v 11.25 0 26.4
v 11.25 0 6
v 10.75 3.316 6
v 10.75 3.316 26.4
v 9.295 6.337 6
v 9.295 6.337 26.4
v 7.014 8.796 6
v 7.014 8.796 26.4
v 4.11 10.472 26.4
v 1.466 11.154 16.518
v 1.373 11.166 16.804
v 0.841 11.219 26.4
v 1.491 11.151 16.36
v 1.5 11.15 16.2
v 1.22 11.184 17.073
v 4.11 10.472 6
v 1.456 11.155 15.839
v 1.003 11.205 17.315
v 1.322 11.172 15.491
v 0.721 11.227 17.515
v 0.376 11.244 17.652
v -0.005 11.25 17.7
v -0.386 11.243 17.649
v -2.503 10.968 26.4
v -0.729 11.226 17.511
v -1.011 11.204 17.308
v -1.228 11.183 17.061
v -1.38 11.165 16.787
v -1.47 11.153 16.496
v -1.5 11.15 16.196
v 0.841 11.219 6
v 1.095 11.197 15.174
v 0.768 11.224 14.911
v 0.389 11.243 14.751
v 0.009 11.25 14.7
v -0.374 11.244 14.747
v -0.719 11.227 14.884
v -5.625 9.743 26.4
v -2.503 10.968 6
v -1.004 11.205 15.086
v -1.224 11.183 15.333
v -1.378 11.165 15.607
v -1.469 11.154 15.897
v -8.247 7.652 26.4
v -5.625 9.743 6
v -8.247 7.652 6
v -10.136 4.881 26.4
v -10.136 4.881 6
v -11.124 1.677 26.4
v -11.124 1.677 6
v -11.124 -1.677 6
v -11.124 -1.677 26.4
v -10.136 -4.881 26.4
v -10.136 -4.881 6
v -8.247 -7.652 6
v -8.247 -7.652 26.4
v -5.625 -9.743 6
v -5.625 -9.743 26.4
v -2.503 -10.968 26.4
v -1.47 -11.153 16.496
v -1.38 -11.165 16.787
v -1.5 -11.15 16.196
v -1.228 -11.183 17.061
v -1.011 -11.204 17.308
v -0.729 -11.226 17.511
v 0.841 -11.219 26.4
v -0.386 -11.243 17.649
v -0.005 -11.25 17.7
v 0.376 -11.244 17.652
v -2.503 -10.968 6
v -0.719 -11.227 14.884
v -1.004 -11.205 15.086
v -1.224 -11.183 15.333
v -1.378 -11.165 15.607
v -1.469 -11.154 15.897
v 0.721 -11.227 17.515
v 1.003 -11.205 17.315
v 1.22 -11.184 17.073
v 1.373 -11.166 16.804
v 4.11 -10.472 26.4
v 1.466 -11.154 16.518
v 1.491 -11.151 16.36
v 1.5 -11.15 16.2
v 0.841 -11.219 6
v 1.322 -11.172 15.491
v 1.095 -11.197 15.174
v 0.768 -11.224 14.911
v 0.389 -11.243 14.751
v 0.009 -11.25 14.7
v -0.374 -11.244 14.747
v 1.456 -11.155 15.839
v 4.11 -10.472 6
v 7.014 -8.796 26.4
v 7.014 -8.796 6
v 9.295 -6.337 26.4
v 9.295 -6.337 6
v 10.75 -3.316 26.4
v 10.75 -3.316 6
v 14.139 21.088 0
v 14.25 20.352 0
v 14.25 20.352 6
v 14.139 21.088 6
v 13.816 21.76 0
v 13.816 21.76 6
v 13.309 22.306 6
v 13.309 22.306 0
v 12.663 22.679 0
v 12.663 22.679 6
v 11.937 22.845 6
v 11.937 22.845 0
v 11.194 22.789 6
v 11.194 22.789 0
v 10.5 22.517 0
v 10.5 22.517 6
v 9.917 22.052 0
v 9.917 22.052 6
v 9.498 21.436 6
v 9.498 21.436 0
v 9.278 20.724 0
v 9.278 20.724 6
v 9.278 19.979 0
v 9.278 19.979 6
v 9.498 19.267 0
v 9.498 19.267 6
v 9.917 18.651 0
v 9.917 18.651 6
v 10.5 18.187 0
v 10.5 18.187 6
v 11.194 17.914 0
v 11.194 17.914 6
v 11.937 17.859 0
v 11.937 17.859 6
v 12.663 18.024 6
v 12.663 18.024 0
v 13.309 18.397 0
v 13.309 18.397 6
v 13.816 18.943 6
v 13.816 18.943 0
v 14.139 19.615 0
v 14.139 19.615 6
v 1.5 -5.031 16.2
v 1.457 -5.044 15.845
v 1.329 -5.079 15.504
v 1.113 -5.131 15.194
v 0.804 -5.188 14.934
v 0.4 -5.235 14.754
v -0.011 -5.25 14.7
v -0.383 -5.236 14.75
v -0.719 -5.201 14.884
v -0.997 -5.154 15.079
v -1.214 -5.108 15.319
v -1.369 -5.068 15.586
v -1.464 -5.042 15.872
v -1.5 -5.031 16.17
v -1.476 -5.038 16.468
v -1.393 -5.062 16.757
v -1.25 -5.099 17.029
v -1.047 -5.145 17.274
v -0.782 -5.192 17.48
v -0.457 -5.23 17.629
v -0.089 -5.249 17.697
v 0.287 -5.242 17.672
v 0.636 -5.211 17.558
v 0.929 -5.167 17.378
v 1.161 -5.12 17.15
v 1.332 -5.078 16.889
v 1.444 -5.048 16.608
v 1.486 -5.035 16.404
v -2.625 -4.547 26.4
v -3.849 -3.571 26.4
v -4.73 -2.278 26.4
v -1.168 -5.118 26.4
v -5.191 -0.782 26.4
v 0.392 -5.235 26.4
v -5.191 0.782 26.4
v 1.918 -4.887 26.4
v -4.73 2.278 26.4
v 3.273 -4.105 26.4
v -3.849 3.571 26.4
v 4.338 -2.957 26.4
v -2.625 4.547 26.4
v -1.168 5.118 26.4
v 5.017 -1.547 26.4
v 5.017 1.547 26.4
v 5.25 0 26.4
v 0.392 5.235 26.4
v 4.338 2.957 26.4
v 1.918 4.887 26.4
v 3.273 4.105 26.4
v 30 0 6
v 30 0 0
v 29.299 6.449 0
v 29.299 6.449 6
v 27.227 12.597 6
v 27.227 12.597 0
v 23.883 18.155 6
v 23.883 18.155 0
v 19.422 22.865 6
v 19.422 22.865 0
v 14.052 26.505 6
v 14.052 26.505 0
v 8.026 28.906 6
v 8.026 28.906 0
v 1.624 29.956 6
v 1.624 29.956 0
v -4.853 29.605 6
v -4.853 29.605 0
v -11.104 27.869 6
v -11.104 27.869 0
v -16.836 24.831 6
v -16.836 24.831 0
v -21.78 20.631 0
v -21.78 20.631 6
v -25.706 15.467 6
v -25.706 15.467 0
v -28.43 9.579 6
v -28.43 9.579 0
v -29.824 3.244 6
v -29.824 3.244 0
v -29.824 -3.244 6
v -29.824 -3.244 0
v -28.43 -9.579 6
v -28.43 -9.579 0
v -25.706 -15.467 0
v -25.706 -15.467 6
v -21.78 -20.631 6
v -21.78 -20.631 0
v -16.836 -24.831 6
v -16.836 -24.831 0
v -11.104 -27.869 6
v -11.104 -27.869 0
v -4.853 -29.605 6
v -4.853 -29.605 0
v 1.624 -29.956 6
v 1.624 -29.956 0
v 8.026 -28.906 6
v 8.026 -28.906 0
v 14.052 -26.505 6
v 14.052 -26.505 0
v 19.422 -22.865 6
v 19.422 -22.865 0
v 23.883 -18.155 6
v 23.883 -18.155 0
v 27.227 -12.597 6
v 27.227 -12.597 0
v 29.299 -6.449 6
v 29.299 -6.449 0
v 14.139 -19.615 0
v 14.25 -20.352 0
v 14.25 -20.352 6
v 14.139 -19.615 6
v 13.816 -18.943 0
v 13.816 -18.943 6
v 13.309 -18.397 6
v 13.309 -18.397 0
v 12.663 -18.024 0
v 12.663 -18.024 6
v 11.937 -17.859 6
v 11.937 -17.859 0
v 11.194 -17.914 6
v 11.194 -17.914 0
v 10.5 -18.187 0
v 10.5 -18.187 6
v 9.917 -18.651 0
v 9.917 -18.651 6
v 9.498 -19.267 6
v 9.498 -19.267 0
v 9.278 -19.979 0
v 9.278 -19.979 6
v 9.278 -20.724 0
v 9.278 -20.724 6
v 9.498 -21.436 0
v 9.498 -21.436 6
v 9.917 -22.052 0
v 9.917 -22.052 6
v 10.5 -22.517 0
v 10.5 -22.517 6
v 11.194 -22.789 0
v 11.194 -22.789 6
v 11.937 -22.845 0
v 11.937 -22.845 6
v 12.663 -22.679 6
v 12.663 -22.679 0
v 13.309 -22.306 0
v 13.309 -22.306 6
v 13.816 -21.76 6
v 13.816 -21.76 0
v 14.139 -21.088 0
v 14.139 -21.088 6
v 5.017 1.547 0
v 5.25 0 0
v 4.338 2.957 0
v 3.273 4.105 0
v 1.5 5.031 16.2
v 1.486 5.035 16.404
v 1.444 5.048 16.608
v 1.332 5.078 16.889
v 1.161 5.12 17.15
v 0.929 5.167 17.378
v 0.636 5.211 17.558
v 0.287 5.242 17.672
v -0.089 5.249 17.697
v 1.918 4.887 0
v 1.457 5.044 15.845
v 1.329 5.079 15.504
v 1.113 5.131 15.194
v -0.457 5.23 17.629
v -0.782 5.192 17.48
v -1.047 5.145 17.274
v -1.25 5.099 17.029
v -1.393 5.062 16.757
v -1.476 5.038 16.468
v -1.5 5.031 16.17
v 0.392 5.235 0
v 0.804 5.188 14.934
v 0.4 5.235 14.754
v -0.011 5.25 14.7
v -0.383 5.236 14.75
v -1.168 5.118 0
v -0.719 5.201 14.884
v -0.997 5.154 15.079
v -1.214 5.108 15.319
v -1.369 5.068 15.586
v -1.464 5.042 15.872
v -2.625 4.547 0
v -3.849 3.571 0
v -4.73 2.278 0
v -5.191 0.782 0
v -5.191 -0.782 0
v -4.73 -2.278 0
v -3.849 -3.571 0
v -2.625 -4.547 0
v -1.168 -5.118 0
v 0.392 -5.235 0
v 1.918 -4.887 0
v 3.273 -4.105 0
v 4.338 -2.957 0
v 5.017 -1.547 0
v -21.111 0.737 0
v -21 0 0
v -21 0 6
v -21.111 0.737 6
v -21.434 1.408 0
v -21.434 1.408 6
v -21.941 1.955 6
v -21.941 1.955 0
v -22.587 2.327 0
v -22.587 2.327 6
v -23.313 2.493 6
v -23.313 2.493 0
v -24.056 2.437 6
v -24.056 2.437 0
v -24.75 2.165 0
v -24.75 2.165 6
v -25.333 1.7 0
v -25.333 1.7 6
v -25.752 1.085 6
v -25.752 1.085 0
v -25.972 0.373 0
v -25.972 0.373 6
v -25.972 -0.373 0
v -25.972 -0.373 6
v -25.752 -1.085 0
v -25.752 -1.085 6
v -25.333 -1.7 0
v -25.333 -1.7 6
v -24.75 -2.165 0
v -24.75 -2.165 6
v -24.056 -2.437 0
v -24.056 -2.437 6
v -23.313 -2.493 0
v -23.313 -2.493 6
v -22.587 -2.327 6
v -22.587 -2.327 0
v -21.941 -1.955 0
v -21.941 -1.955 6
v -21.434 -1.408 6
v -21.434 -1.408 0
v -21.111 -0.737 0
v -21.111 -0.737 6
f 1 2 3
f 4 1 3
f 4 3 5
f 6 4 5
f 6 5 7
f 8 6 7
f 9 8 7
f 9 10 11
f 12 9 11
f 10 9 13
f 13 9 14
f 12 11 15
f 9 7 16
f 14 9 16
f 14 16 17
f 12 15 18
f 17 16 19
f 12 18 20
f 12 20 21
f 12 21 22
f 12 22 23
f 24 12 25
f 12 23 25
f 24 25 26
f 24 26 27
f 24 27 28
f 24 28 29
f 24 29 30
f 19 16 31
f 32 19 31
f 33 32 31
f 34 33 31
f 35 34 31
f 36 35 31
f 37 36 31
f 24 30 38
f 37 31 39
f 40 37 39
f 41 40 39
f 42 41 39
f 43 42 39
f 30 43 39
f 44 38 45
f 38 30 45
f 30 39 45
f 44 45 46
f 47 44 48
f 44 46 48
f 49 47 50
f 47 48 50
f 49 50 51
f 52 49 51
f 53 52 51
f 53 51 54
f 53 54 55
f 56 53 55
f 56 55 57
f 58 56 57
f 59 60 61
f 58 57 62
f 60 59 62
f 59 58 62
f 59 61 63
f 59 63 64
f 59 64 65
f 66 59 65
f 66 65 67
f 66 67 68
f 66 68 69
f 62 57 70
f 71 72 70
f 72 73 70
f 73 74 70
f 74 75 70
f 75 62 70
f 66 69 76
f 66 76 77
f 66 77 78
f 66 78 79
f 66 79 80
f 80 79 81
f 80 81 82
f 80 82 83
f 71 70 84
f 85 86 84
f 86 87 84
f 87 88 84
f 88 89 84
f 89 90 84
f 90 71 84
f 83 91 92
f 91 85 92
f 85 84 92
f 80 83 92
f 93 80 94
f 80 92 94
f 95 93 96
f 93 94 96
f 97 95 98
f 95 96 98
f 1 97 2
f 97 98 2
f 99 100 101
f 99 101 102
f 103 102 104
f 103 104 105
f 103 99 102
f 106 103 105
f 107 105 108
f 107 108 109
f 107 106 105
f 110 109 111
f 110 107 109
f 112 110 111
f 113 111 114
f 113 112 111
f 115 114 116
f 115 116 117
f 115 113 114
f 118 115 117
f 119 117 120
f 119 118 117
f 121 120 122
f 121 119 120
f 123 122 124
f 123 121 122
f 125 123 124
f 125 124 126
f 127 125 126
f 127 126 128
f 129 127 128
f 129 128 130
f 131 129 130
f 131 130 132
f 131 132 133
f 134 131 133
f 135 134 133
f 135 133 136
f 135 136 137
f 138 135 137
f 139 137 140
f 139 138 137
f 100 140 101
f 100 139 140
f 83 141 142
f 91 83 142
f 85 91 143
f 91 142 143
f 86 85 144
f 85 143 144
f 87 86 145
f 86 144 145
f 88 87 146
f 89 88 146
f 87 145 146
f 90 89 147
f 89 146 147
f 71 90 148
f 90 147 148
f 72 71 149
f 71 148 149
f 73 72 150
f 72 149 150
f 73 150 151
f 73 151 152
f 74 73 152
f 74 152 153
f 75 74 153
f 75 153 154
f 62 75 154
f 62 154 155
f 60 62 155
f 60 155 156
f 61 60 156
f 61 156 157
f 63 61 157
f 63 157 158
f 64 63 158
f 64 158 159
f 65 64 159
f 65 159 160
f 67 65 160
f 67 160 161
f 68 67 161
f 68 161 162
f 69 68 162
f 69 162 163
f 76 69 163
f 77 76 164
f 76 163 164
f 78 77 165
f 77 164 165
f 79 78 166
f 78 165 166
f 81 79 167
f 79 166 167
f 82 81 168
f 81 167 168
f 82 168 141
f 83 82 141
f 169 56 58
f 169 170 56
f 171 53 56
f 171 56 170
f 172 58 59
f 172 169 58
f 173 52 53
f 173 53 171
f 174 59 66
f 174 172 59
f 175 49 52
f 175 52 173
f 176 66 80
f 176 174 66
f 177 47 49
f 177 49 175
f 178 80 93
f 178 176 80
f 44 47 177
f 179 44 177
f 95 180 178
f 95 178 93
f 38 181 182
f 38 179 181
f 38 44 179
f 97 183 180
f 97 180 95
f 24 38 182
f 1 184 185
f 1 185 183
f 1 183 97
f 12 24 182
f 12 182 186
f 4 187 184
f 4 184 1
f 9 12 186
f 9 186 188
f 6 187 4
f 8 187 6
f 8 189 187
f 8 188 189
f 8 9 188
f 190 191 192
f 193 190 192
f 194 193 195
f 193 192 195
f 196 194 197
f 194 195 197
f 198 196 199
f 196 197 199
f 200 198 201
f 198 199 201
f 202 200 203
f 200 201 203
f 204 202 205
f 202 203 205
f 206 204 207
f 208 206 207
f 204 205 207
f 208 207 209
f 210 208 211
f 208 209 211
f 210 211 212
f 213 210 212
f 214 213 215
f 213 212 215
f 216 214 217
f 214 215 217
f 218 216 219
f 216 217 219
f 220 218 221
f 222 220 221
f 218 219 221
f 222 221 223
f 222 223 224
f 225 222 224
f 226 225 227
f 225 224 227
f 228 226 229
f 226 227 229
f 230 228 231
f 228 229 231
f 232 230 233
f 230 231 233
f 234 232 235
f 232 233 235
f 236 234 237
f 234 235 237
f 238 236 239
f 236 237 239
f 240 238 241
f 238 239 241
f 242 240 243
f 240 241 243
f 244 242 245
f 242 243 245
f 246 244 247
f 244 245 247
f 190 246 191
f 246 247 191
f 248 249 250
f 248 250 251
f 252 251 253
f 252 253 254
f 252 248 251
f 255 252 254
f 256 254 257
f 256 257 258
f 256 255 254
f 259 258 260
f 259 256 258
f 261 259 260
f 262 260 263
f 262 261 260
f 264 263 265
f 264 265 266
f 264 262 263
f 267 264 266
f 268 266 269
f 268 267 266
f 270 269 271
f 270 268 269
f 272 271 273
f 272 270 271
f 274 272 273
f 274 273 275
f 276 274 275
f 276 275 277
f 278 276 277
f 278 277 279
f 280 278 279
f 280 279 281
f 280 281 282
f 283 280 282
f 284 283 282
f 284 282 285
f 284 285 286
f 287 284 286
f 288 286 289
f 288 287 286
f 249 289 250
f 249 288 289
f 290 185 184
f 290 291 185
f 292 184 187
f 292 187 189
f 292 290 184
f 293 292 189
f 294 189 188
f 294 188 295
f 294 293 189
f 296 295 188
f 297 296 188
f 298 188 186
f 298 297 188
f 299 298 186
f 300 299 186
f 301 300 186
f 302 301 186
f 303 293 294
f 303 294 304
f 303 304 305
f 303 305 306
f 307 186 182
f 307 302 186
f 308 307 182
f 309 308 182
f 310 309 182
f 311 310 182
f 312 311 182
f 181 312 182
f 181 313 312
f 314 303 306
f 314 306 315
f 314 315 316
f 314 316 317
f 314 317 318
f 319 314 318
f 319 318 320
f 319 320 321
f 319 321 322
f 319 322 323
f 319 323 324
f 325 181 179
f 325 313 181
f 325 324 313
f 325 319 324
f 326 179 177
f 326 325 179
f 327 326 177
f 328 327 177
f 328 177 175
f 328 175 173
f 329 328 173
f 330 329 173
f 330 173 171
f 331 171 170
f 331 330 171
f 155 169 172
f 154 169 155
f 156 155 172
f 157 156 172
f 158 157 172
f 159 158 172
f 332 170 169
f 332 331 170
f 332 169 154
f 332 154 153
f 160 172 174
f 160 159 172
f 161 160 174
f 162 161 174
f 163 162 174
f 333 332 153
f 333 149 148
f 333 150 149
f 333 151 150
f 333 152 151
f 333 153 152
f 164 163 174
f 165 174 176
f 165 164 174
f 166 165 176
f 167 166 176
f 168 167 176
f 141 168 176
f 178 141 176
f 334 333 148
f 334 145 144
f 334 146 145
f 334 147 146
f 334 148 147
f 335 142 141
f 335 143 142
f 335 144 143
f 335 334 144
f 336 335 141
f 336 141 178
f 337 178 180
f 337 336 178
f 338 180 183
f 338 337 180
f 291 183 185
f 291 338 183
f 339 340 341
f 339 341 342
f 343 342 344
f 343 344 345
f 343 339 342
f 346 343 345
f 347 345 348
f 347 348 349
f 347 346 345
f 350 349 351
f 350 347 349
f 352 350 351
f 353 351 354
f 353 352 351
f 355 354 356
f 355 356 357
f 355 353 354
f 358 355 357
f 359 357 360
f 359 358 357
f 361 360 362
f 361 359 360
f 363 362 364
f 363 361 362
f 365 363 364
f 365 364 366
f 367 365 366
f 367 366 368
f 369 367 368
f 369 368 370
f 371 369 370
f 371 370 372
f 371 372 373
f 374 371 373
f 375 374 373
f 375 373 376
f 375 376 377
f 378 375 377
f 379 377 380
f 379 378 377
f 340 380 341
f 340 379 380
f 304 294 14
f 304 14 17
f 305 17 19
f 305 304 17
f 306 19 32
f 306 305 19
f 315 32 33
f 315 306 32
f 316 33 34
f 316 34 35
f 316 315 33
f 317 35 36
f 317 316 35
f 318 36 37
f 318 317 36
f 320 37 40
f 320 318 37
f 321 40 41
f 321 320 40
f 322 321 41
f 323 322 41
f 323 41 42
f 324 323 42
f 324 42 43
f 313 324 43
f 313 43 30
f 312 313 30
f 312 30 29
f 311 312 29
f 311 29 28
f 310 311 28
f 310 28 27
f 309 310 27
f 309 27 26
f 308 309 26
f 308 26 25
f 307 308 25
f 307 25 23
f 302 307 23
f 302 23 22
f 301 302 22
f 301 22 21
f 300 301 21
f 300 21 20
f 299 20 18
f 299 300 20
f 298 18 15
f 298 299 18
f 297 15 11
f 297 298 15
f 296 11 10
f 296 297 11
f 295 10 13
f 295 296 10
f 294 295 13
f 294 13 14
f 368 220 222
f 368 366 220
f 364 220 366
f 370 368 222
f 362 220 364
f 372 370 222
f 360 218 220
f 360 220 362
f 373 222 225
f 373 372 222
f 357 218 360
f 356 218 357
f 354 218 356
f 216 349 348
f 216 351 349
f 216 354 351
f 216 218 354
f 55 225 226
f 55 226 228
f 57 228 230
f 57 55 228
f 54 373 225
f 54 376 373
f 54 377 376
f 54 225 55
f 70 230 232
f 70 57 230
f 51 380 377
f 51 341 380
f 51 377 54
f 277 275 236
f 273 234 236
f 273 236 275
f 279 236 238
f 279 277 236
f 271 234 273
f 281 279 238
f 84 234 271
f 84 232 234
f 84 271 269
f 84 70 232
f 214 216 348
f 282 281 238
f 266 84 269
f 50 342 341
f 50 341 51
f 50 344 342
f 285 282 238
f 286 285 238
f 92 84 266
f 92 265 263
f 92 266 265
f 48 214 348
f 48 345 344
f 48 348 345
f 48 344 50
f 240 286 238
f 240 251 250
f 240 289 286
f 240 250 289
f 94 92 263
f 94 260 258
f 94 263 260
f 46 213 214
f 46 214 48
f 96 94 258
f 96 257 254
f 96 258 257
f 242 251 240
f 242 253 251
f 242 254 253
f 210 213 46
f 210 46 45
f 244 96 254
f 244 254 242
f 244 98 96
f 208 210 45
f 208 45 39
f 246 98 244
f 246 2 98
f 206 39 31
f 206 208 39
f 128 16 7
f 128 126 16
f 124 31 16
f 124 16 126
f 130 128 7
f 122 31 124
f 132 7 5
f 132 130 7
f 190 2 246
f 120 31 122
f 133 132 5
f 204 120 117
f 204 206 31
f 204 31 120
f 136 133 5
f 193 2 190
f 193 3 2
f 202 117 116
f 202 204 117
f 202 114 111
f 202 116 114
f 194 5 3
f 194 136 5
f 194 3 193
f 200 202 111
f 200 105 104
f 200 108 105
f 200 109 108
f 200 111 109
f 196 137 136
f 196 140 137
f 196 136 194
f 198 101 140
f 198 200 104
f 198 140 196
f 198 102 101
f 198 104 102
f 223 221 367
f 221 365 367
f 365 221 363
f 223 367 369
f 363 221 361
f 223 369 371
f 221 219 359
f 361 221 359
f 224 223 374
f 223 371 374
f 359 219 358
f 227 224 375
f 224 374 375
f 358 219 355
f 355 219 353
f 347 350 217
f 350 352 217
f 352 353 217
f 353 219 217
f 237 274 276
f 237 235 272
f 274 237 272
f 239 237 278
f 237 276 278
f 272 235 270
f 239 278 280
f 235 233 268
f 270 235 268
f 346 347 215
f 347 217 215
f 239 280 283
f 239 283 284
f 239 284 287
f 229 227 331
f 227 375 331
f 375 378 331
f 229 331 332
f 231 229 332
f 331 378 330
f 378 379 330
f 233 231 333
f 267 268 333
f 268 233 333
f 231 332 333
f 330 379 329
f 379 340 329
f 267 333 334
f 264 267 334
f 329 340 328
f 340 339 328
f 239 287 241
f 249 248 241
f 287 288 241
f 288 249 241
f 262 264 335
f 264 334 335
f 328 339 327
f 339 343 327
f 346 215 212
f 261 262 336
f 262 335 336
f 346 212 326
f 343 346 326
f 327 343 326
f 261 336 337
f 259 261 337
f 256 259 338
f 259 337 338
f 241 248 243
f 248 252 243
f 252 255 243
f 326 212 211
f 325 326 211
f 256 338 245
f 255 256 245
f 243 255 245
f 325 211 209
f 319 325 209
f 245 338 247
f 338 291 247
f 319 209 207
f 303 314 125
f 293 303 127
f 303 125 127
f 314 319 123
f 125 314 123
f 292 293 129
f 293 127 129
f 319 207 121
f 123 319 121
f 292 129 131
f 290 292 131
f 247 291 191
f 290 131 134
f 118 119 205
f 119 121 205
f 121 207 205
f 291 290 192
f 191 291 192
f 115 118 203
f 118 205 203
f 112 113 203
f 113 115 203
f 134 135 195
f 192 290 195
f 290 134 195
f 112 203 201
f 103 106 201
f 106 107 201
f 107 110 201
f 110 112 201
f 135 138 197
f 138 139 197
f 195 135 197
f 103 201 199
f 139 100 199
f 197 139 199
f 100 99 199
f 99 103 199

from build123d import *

# Parameters (mm, degrees)
SKETCH_1_R               = 30
SKETCH_1_R_2             = 2.5
SKETCH_1_R_3             = 5.25
EXTRUDE_1_DEPTH          = 6
SKETCH_3_R               = 11.25
SKETCH_3_R_2             = 5.25
EXTRUDE_2_DEPTH          = 20.4
SKETCH_4_R               = 1.5
CUT_EXTRUDE_1_DEPTH      = 31
CUT_EXTRUDE_1_DEPTH_BACK = 31


with BuildPart() as part:
    # ｽｹｯﾁ1 → ﾎﾞｽ - 押し出し1 (new body)
    with BuildSketch(Plane.XY):
        Circle(SKETCH_1_R)
        with Locations((-23.5, 0)):
            Circle(SKETCH_1_R_2, mode=Mode.SUBTRACT)
        with Locations((11.75, -20.351596989)):
            Circle(SKETCH_1_R_2, mode=Mode.SUBTRACT)
        with Locations((11.75, 20.351596989)):
            Circle(SKETCH_1_R_2, mode=Mode.SUBTRACT)
        Circle(SKETCH_1_R_3, mode=Mode.SUBTRACT)
    extrude(amount=EXTRUDE_1_DEPTH)

    # ｽｹｯﾁ3 → ﾎﾞｽ - 押し出し2 (add)
    with BuildSketch(Plane.XY.offset(6)):
        Circle(SKETCH_3_R)
        Circle(SKETCH_3_R_2, mode=Mode.SUBTRACT)
    extrude(amount=EXTRUDE_2_DEPTH)

    # ｽｹｯﾁ4 → ｶｯﾄ - 押し出し1 (cut, two sides)
    with BuildSketch(Plane(origin=(0, 0, 0), x_dir=(1, 0, 0), z_dir=(0, 1, 0))) as cut_extrude_1_sk:
        with Locations((0, -16.2)):
            Circle(SKETCH_4_R)
    extrude(amount=CUT_EXTRUDE_1_DEPTH, mode=Mode.SUBTRACT)
    extrude(cut_extrude_1_sk.sketch, amount=-CUT_EXTRUDE_1_DEPTH_BACK, mode=Mode.SUBTRACT)


solid = part.part
